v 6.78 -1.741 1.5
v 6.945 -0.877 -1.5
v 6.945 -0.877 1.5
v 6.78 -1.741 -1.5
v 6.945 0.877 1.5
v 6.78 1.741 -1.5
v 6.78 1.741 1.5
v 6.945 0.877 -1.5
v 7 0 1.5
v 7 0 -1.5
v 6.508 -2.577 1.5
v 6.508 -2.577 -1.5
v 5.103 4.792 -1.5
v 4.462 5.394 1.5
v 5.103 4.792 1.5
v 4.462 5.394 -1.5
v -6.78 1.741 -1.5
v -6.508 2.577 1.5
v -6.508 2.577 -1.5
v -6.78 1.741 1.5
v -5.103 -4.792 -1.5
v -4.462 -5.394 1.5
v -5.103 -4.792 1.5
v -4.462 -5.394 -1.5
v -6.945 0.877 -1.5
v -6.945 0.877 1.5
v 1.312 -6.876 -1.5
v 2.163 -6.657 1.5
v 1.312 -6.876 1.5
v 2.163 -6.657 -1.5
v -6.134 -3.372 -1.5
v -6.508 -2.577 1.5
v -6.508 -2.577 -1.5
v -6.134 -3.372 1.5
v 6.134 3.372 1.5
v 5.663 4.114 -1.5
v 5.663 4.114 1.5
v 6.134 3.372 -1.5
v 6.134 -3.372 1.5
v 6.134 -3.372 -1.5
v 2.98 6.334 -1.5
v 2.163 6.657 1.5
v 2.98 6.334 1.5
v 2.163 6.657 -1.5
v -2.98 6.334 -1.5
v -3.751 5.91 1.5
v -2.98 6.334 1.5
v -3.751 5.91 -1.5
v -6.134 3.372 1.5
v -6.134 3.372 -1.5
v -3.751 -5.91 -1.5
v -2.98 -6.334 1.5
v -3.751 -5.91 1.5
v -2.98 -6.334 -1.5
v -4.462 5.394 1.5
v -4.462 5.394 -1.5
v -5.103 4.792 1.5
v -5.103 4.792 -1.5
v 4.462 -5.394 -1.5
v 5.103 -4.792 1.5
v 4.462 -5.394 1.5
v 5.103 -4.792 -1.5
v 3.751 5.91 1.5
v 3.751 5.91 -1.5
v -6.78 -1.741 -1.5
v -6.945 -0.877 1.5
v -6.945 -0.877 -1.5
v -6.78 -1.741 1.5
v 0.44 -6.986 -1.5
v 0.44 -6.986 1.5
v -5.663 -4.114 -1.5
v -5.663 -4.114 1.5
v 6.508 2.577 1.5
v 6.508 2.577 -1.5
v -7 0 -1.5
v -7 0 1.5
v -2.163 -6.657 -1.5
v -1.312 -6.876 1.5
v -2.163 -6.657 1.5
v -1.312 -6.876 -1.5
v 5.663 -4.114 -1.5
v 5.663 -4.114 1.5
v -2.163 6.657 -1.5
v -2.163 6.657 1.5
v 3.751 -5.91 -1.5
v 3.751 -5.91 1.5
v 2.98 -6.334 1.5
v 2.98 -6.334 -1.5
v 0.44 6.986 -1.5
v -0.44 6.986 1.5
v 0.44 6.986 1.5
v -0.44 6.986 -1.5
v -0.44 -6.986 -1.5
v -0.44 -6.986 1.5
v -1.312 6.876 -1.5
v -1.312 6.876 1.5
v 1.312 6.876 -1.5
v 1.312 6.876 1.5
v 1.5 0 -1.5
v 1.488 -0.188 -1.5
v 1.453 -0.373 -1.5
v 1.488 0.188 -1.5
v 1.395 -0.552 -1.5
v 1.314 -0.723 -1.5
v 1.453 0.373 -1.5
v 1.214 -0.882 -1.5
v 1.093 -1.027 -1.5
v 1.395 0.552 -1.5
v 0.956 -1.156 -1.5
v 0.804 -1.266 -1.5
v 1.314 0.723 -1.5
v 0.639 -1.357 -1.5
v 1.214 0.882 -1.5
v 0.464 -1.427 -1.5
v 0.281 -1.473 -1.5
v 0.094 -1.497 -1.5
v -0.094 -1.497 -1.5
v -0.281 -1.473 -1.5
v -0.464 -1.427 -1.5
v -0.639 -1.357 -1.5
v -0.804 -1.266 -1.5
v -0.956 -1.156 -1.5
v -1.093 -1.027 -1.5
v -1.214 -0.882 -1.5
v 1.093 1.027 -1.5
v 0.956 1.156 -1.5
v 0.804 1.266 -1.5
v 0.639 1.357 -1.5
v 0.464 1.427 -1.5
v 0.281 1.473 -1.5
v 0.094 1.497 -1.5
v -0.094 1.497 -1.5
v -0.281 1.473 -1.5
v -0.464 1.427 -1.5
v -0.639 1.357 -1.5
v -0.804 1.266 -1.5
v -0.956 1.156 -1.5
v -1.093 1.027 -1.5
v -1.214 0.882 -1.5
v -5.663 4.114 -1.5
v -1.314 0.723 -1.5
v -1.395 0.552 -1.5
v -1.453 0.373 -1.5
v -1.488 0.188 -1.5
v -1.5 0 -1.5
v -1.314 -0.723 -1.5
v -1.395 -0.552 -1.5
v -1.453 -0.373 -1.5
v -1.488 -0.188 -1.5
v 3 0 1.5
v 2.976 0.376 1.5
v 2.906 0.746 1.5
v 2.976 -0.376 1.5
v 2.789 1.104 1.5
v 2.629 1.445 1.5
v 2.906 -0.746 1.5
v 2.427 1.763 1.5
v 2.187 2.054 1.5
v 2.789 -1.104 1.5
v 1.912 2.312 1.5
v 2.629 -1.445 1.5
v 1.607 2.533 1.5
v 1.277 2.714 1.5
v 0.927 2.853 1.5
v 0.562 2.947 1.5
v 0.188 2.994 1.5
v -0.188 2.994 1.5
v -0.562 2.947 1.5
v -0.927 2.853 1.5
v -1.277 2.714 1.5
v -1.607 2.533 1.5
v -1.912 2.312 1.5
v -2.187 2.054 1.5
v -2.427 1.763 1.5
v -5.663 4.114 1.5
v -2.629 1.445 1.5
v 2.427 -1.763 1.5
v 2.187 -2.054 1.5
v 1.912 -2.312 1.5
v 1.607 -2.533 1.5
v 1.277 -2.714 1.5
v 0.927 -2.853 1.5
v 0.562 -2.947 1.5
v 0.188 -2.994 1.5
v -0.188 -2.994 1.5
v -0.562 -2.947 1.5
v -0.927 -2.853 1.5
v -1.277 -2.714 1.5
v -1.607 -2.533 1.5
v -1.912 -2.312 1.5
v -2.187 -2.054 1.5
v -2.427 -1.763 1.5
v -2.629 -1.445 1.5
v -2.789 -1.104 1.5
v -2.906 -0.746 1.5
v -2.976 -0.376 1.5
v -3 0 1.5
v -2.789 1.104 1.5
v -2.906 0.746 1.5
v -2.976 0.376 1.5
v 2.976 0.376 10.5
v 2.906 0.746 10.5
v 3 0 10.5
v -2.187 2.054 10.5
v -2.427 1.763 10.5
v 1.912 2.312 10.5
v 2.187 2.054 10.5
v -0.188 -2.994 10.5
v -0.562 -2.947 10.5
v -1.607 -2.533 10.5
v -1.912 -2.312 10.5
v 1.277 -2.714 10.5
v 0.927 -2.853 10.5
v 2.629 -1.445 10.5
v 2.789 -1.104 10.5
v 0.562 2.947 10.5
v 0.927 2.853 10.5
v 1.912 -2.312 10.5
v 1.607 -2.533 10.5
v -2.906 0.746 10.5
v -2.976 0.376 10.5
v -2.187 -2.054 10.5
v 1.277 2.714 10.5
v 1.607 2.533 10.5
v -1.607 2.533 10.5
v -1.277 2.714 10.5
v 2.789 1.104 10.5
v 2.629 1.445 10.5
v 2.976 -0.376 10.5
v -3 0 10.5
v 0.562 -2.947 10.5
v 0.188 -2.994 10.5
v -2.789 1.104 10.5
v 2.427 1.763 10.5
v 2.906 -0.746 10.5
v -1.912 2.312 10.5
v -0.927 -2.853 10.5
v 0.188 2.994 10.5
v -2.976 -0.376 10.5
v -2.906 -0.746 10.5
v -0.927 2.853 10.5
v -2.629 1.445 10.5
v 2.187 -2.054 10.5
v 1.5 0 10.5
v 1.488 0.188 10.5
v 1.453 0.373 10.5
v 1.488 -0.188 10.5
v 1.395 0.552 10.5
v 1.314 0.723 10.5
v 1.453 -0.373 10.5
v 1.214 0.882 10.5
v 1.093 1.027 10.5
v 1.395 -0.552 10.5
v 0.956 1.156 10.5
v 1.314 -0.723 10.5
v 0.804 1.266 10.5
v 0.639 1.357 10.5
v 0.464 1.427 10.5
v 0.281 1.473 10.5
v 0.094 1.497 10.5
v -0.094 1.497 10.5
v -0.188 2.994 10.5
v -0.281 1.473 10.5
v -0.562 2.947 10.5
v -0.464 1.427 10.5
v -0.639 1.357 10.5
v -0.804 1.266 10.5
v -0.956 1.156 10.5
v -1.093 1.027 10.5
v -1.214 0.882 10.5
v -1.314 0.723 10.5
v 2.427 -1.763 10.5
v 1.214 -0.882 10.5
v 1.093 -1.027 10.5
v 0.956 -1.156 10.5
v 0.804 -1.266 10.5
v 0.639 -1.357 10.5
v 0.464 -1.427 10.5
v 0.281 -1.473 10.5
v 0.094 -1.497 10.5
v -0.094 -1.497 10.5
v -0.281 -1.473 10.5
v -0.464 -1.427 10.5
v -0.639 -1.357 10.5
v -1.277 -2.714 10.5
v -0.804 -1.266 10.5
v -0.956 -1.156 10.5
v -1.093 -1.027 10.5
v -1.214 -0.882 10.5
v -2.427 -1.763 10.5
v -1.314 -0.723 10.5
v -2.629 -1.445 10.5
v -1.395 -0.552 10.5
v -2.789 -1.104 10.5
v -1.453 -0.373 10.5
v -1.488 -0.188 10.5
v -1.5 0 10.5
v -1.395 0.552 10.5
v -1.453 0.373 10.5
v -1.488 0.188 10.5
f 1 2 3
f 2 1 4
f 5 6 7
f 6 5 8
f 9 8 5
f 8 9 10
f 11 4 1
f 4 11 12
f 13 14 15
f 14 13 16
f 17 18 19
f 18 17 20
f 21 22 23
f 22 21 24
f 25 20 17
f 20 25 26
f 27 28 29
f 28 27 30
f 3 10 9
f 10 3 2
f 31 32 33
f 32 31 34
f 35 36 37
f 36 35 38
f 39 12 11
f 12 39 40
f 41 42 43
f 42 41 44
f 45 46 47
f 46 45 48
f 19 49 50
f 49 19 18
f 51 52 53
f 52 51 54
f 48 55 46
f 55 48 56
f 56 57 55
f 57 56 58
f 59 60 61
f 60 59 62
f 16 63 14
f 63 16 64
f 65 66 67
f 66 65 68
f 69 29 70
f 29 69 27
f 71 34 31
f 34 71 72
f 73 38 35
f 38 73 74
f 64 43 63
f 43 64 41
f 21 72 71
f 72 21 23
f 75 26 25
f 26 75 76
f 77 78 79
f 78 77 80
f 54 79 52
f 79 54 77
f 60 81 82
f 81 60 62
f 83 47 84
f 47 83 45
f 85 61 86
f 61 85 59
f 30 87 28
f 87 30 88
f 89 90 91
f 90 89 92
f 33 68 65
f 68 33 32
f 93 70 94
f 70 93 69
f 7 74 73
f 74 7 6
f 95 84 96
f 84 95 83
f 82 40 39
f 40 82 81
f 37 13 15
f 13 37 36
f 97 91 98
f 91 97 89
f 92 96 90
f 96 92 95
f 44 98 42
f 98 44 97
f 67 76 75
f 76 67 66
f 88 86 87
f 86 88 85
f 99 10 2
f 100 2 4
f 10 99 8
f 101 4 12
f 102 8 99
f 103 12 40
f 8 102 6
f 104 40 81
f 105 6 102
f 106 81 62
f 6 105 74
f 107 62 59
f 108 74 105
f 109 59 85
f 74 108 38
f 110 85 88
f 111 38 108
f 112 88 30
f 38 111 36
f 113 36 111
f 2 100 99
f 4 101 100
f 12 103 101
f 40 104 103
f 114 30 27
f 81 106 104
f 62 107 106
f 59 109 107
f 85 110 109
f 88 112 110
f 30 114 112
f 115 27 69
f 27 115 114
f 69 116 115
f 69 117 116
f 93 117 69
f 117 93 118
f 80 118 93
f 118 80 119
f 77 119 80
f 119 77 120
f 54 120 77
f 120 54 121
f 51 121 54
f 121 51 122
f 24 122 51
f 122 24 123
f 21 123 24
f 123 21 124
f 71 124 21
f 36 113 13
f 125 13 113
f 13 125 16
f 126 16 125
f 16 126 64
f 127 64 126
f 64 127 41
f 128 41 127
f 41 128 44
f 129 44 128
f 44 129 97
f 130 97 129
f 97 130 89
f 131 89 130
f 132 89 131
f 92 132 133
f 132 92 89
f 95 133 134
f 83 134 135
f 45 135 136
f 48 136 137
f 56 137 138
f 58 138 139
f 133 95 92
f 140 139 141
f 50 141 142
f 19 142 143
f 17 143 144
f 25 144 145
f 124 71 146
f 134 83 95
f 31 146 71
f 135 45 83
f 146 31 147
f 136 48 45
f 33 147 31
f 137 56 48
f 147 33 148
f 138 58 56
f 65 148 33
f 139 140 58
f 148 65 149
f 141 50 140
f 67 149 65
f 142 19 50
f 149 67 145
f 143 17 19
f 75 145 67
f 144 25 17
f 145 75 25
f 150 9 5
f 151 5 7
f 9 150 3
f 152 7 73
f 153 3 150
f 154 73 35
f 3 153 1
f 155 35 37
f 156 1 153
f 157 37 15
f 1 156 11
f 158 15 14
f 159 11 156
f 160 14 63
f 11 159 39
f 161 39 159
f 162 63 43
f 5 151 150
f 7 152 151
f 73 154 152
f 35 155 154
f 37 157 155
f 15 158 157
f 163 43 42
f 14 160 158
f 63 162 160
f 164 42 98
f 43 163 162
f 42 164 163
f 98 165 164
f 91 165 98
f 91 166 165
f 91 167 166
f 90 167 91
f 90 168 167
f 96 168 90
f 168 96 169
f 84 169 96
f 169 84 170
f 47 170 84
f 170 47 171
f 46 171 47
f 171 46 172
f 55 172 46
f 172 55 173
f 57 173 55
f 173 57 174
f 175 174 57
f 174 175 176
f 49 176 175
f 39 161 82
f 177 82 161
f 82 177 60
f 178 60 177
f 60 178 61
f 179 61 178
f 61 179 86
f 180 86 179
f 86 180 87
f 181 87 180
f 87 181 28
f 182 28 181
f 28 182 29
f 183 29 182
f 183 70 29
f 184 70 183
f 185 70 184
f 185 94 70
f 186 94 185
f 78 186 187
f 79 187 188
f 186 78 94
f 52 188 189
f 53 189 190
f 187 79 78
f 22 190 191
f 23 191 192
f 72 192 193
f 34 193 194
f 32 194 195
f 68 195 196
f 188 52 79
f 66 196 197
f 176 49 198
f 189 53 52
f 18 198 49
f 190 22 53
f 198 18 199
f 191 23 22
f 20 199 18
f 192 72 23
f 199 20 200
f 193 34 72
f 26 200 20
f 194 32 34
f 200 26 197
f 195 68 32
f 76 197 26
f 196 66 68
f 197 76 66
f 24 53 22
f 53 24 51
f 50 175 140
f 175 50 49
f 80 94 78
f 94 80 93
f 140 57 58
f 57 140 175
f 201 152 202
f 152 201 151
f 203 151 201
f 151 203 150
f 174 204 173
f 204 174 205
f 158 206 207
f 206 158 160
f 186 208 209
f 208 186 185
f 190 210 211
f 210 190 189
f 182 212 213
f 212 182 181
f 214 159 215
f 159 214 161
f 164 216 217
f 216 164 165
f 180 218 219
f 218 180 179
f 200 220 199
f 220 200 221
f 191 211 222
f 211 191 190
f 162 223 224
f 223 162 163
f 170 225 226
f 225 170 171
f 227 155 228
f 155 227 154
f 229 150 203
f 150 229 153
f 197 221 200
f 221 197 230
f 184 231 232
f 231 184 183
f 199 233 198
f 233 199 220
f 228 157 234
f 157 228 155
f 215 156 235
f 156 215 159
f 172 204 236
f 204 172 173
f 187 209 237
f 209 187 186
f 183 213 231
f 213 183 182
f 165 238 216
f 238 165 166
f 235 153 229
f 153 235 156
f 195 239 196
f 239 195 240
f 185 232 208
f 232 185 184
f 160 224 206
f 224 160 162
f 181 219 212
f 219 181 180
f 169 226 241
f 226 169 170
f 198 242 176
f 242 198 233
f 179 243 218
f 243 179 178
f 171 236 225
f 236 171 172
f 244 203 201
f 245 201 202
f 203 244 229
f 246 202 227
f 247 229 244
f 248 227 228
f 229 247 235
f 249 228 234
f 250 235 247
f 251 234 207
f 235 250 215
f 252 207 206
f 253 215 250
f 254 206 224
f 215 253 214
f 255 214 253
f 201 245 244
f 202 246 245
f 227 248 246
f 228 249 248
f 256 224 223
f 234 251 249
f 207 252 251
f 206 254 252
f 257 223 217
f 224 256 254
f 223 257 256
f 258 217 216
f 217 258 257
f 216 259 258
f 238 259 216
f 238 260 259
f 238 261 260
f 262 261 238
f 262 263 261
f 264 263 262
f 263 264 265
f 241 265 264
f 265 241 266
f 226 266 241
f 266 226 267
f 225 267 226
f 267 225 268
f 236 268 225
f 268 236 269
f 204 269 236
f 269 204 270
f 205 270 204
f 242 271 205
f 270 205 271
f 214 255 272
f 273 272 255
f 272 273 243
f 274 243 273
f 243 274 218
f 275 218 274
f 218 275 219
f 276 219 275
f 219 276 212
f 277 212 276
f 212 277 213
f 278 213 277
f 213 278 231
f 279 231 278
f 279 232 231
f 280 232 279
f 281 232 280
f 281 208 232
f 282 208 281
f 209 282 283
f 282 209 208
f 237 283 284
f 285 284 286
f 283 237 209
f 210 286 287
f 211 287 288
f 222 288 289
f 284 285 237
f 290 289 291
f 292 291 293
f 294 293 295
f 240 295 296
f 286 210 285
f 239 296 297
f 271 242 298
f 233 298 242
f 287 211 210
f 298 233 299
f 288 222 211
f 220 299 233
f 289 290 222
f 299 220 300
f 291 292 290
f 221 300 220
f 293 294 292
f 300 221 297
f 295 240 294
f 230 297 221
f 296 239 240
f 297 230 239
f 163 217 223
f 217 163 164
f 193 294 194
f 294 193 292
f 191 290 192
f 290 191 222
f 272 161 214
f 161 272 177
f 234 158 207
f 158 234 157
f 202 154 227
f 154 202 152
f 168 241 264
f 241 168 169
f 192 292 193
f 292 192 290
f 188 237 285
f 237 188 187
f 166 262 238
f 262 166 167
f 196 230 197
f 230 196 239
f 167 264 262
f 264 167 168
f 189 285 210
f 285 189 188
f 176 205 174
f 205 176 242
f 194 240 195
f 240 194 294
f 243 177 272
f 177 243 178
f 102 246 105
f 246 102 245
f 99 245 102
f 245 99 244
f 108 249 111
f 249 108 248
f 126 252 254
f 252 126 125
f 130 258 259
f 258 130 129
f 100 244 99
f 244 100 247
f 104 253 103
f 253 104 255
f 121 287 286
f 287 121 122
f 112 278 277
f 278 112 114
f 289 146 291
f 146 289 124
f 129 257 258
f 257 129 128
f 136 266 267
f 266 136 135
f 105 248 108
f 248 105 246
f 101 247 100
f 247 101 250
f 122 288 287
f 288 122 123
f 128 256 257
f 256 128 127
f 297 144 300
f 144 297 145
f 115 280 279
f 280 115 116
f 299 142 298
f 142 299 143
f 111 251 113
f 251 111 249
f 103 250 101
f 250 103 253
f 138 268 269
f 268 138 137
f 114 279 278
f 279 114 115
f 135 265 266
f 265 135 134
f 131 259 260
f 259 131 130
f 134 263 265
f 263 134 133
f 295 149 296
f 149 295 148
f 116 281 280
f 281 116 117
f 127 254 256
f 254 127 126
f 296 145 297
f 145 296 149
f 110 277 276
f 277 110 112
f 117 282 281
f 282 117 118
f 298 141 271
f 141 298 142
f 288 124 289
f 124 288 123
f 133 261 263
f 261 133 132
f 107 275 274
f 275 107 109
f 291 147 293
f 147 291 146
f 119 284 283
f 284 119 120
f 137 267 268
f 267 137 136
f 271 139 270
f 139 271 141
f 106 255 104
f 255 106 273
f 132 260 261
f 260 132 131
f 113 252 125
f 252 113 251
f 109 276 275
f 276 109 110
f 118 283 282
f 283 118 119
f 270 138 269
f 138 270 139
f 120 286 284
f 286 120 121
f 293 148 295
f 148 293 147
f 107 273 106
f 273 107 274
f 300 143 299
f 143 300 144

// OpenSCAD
$fn = 50;


difference() {
	union() {
		translate(v = [0, 0, -1.5000000000]) {
			cylinder(h = 3, r = 7.0000000000);
		}
		translate(v = [0, 0, -1.5000000000]) {
			cylinder(h = 12, r = 3.0000000000);
		}
	}
	union() {
		translate(v = [0, 0, -50.0000000000]) {
			cylinder(h = 100, r = 1.5000000000);
		}
	}
}
